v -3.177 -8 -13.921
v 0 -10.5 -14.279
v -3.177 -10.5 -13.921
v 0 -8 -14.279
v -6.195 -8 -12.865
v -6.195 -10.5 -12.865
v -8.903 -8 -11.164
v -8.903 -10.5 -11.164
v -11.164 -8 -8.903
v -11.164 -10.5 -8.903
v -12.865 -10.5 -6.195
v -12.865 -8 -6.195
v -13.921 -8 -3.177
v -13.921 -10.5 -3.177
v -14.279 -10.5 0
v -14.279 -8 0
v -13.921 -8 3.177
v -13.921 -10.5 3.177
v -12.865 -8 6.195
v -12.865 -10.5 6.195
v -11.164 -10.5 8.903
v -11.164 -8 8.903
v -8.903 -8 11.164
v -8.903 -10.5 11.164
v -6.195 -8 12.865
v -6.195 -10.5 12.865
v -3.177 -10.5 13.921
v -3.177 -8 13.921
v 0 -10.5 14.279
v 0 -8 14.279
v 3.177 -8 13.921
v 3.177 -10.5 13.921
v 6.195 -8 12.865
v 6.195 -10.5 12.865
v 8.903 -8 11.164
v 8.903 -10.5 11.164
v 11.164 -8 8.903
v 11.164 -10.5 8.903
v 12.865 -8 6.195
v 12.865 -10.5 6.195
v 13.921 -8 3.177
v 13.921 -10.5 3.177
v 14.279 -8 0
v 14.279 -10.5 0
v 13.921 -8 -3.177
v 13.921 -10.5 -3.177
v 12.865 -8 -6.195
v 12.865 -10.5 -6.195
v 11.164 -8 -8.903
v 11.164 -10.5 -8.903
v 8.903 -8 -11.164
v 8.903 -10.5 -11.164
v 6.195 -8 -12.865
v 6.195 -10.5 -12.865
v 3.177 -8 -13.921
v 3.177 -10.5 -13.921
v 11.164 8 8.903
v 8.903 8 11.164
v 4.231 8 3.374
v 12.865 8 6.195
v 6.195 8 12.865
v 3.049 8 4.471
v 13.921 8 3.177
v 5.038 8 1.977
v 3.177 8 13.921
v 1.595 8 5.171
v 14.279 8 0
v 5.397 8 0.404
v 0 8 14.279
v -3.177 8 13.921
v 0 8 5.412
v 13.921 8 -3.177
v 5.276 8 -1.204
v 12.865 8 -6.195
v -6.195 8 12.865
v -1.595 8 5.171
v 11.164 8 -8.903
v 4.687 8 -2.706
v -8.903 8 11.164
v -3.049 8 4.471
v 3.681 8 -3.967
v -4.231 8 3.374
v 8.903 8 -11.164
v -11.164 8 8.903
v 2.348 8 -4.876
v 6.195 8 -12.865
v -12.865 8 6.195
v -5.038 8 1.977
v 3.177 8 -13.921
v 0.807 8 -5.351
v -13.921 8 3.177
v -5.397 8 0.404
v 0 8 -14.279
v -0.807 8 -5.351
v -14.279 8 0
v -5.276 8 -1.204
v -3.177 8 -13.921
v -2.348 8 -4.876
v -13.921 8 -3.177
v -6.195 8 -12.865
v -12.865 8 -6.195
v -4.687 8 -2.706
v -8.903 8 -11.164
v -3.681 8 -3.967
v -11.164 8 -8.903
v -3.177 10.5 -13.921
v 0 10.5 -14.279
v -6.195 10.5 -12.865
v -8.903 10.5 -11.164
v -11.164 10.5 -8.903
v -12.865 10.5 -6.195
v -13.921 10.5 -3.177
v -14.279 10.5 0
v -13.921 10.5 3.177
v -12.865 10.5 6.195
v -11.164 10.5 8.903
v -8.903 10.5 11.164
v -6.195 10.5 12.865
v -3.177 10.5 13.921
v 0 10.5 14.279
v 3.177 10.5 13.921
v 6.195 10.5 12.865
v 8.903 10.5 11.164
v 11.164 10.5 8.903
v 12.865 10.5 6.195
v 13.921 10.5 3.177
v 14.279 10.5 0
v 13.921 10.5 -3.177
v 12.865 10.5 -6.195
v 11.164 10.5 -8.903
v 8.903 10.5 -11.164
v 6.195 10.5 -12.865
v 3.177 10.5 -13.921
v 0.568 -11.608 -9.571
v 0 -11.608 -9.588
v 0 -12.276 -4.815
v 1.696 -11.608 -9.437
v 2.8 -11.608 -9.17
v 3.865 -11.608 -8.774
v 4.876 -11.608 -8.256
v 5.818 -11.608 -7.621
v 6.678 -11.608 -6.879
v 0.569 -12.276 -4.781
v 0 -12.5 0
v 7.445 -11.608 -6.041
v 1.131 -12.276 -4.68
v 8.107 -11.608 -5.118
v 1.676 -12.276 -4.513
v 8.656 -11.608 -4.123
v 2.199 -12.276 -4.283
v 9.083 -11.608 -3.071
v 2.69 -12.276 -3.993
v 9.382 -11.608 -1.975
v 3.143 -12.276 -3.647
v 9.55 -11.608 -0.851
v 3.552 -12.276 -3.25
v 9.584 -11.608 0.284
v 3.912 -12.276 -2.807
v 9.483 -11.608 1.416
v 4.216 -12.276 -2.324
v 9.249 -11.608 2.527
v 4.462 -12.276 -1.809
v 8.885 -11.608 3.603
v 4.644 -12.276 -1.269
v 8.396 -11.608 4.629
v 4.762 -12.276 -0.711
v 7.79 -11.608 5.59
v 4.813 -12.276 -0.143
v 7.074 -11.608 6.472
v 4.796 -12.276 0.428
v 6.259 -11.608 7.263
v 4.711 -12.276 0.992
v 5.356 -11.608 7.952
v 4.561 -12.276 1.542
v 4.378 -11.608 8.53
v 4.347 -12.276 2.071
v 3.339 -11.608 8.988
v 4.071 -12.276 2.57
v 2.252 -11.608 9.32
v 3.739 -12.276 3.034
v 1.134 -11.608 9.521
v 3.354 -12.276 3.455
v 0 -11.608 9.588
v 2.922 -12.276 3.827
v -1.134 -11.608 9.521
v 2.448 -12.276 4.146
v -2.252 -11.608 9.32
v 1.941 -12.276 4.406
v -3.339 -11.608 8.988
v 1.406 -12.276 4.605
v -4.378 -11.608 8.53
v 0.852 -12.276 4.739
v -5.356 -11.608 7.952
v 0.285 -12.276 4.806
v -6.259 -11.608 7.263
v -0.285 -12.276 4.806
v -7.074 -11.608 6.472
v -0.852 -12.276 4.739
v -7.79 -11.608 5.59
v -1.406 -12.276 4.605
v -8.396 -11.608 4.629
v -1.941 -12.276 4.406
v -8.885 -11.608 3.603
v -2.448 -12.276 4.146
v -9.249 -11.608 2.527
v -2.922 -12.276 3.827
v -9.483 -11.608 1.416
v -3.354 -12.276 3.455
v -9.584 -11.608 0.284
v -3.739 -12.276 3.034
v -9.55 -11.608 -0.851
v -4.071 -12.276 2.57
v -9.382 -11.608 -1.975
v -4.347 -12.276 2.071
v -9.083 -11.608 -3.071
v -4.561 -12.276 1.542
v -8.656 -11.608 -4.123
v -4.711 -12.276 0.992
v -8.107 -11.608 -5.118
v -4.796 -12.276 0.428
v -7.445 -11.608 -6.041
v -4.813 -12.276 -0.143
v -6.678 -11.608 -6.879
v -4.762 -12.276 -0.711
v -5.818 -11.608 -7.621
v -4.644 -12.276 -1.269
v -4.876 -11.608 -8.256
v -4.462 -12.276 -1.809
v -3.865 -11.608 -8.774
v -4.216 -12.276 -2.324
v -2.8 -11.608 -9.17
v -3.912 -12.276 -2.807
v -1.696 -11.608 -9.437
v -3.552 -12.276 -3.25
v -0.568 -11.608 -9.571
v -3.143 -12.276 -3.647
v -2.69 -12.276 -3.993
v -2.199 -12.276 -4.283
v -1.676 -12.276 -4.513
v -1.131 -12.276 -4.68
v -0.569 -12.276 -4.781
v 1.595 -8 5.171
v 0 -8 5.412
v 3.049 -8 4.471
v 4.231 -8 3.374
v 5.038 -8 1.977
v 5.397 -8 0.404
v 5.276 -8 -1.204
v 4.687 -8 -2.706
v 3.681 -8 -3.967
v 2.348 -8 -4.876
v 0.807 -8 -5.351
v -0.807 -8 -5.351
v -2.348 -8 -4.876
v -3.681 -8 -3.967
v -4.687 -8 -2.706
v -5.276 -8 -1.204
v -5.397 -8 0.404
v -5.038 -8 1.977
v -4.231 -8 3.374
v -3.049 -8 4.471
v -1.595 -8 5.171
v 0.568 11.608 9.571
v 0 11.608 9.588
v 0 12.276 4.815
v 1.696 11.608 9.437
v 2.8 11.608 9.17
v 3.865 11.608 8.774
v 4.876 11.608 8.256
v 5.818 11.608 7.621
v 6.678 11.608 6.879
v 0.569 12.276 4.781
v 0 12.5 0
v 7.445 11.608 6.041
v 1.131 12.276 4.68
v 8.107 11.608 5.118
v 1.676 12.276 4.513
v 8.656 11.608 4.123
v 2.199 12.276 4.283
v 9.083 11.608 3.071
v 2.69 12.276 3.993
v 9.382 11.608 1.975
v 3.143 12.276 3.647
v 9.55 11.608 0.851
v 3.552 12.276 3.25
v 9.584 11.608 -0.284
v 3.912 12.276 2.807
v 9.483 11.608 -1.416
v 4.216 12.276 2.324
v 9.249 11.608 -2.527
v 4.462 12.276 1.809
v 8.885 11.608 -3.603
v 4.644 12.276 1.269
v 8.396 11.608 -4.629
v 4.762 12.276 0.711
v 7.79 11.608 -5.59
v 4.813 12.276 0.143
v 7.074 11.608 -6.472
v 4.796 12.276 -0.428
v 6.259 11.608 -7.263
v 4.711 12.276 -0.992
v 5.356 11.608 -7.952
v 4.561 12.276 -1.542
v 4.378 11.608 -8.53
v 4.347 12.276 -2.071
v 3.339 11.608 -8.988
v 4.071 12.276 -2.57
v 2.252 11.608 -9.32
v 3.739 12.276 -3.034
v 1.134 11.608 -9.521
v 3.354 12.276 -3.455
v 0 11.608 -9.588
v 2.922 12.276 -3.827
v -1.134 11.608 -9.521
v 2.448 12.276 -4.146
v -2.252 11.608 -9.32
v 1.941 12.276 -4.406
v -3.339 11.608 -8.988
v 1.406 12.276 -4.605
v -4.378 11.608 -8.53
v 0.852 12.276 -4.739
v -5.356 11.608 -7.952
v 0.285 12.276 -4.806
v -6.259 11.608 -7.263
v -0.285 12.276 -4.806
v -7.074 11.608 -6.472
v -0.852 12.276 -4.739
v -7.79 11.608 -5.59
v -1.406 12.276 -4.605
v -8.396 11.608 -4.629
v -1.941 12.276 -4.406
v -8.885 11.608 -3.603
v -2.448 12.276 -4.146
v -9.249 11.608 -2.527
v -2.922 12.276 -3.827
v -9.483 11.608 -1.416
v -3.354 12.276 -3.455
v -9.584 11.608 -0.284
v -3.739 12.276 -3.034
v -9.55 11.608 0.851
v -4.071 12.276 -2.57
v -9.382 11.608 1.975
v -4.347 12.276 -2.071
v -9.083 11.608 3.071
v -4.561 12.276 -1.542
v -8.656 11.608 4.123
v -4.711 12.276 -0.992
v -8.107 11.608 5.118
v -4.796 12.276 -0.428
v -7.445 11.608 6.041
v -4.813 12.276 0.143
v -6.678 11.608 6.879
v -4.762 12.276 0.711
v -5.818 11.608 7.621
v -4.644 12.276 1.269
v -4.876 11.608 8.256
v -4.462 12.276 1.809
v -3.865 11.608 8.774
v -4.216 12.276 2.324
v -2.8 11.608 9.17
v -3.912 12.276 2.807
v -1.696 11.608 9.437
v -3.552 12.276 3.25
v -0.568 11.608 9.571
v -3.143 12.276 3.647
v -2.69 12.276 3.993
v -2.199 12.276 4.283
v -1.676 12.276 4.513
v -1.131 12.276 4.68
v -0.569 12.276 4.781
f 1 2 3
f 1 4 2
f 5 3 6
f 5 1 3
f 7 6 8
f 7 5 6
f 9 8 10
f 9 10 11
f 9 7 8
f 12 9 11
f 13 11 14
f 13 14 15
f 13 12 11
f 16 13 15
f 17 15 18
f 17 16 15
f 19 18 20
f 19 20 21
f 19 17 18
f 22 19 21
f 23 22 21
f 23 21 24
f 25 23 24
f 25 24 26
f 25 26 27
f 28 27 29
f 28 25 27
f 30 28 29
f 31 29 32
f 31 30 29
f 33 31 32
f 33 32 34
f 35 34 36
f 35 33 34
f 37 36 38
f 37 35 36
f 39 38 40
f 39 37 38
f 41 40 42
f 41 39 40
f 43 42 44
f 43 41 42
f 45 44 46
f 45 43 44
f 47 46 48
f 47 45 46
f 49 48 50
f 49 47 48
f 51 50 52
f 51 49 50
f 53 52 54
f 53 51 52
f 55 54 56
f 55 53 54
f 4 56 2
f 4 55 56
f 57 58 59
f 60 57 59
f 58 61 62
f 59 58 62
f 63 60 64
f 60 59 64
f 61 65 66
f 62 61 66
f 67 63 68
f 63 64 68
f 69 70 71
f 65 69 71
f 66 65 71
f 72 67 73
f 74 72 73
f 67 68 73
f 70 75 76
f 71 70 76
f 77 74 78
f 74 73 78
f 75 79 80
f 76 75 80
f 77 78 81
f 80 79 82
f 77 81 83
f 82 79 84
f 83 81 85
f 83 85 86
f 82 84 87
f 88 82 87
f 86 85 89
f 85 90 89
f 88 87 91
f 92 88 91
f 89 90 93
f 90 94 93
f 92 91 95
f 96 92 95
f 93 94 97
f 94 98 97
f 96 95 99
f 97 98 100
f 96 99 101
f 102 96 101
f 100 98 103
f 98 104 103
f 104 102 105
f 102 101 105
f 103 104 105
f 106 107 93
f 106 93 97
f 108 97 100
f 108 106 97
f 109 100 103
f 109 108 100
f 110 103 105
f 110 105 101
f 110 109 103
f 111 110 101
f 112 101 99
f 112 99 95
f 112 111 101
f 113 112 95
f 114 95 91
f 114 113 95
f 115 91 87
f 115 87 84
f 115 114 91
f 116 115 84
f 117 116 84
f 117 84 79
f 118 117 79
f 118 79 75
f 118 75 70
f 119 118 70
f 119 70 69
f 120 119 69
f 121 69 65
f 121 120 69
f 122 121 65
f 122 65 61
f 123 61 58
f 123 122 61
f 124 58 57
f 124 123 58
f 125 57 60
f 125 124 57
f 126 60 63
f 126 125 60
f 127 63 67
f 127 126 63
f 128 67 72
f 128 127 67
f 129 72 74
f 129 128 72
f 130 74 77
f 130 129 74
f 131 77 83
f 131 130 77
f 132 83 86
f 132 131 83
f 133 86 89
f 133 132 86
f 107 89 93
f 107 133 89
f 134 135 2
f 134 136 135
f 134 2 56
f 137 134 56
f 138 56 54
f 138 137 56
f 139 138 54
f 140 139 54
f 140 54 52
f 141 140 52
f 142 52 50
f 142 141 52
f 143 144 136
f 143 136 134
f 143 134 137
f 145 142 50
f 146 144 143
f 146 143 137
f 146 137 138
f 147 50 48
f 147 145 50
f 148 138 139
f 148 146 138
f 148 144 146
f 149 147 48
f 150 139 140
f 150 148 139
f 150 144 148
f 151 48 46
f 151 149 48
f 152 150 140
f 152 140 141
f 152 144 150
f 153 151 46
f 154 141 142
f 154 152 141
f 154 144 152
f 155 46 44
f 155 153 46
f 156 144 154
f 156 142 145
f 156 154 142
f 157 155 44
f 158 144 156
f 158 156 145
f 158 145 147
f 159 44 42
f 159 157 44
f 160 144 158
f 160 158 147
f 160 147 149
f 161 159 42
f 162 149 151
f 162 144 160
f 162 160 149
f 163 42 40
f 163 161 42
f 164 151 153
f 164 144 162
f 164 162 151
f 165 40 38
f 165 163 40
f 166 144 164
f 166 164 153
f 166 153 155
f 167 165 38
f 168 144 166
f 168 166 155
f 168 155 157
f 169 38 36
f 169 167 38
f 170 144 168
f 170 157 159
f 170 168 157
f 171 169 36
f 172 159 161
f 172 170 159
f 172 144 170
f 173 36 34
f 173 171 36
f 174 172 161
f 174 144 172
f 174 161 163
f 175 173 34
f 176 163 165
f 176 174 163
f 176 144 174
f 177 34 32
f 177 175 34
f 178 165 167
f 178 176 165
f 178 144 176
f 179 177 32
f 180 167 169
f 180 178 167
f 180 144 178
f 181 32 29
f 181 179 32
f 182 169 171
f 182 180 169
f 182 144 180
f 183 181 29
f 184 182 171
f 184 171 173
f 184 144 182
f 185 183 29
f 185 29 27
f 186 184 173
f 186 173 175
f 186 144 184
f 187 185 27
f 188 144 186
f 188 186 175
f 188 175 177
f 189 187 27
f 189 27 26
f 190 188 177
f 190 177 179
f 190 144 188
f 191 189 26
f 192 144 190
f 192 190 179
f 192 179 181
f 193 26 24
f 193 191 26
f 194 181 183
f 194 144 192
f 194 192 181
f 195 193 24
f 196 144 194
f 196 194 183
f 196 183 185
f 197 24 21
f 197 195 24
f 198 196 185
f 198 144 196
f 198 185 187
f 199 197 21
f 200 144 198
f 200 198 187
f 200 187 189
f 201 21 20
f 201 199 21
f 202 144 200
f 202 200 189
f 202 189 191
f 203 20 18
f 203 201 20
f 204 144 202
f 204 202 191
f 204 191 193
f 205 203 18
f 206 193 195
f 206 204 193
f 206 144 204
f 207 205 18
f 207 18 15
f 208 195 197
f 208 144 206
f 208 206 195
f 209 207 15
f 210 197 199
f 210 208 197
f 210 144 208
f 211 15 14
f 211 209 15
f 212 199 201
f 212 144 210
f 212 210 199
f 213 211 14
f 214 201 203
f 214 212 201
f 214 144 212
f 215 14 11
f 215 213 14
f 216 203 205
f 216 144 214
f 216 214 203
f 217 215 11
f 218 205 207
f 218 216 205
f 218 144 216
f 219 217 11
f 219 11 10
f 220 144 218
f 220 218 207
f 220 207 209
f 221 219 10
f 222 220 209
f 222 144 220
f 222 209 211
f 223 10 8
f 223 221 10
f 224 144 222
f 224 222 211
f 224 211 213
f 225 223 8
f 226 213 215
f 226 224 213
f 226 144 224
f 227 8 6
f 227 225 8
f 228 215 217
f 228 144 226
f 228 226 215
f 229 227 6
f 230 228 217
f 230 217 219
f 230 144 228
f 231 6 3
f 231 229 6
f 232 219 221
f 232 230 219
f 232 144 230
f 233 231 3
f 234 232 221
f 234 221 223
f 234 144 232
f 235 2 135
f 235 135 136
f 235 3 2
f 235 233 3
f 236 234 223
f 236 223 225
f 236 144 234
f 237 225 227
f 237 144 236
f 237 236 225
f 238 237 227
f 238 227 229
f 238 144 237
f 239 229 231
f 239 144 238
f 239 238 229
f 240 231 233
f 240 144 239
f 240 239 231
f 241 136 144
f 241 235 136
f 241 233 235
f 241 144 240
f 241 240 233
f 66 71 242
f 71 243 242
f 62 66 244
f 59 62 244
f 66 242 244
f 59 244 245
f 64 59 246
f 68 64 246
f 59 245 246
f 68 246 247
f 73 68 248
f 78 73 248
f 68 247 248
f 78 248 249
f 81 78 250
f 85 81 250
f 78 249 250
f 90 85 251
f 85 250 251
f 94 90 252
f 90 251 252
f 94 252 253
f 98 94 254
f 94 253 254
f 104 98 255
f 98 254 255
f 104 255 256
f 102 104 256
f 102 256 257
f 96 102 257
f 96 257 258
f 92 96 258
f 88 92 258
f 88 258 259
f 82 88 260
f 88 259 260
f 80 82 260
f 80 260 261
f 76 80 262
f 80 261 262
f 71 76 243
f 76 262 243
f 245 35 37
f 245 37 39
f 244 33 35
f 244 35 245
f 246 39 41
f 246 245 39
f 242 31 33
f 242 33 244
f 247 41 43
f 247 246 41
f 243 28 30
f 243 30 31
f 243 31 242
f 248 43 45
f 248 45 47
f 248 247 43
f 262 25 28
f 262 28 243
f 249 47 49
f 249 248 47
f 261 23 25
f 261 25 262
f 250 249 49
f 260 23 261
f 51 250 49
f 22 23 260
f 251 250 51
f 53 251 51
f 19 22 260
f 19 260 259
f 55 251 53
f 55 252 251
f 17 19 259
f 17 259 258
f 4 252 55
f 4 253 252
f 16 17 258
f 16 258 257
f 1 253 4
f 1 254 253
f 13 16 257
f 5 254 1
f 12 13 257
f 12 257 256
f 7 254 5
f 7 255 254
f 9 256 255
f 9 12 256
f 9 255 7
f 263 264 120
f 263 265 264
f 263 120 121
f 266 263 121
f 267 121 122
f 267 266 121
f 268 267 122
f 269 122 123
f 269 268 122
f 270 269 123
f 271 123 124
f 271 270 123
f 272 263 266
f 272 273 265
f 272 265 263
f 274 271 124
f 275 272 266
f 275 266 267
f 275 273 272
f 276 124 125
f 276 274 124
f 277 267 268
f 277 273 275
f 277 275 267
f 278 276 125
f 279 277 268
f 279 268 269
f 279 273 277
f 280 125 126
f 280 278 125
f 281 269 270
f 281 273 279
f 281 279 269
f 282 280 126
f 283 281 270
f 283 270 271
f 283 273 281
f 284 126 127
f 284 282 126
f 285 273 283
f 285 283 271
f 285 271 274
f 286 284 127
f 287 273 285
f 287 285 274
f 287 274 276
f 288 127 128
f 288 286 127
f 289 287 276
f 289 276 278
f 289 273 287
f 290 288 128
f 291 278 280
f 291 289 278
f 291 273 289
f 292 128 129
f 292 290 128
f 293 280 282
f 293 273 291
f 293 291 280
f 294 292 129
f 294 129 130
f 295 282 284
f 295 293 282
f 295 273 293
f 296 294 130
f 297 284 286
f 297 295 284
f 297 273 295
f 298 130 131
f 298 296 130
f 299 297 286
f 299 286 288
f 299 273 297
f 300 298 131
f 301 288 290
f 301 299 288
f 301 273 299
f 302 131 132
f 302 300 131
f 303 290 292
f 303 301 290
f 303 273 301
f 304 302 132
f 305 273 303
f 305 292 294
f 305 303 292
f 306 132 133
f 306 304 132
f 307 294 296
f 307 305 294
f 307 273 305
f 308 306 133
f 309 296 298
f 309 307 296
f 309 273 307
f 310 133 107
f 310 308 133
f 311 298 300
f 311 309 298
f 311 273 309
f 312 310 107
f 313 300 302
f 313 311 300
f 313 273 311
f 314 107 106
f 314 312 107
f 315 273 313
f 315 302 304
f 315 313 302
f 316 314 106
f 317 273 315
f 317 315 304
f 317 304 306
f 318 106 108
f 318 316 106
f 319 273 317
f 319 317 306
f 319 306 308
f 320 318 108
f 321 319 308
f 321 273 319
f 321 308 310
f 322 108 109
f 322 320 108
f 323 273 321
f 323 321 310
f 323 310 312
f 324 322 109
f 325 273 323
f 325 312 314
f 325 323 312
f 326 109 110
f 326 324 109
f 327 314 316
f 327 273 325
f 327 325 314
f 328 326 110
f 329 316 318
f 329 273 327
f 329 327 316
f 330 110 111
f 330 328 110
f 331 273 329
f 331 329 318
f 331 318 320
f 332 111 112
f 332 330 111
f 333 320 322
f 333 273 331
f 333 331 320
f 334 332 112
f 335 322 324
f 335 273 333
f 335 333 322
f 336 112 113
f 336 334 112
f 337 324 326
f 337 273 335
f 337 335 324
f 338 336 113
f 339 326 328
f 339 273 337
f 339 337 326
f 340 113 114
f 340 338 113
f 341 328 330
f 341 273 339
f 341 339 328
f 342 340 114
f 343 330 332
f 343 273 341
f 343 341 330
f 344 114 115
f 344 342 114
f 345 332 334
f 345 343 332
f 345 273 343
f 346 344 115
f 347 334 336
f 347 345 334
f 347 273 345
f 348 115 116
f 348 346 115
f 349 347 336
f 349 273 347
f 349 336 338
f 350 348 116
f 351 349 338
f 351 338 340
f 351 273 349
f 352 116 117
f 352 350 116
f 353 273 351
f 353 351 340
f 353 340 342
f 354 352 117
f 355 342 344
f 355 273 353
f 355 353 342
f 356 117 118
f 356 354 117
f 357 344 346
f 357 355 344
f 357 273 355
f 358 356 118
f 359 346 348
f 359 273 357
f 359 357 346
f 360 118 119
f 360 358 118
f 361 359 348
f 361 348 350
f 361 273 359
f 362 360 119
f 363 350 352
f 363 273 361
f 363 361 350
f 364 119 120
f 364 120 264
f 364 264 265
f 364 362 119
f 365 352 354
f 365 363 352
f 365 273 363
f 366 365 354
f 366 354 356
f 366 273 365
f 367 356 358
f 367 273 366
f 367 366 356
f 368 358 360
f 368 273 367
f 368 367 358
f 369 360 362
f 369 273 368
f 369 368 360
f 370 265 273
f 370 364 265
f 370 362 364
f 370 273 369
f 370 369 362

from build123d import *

# Parameters (mm, degrees)
SKETCH1_R           = 14.278677311
SKETCH1_R_2         = 5.411731441
BOSS_EXTRUDE1_DEPTH = 10.5
SKETCH1_3_R         = 14.278677311
SKETCH1_3_R_2       = 5.411731441
CUT_EXTRUDE1_DEPTH  = 8
DOME1_FACE_RADIUS   = 14.278677311
DOME1_HEIGHT        = 2
DOME2_FACE_RADIUS   = 14.278677311
DOME2_HEIGHT        = 2


with BuildPart() as part:
    # Sketch1 → Boss-Extrude1 (new, symmetric)
    with BuildSketch(Plane(origin=(0, 0, 0), x_dir=(1, 0, 0), z_dir=(0, 1, 0))):
        with Locations(Location((0, 0, 0), (0, 0, 90))):
            Circle(SKETCH1_R)
        Circle(SKETCH1_R_2, mode=Mode.SUBTRACT)
        Circle(SKETCH1_R_2)
    extrude(amount=BOSS_EXTRUDE1_DEPTH, both=True)

    # Sketch1<3> → Cut-Extrude1 (cut, symmetric)
    with BuildSketch(Plane(origin=(0, 0, 0), x_dir=(1, 0, 0), z_dir=(0, 1, 0))):
        with Locations(Location((0, 0, 0), (0, 0, 90))):
            Circle(SKETCH1_3_R)
        with Locations(Location((0, 0, 0), (0, 0, 270))):
            Circle(SKETCH1_3_R_2, mode=Mode.SUBTRACT)
    extrude(amount=CUT_EXTRUDE1_DEPTH, both=True, mode=Mode.SUBTRACT)

    # Dome1: a dome of height H over a round flat face of radius A is a cap of a sphere of radius (A * A + H * H) / (2 * H)
    dome1_r = (DOME1_FACE_RADIUS * DOME1_FACE_RADIUS + DOME1_HEIGHT * DOME1_HEIGHT) / (2 * DOME1_HEIGHT)
    dome1_base = Plane((0, -10.5, 0), z_dir=(0, -1, 0))
    with Locations(dome1_base.offset(DOME1_HEIGHT - dome1_r)):
        dome1_ball = Sphere(dome1_r, mode=Mode.PRIVATE)
    add(split(dome1_ball, bisect_by=dome1_base, keep=Keep.TOP, mode=Mode.PRIVATE))

    # Dome2: a dome of height H over a round flat face of radius A is a cap of a sphere of radius (A * A + H * H) / (2 * H)
    dome2_r = (DOME2_FACE_RADIUS * DOME2_FACE_RADIUS + DOME2_HEIGHT * DOME2_HEIGHT) / (2 * DOME2_HEIGHT)
    dome2_base = Plane((0, 10.5, 0), z_dir=(0, 1, 0))
    with Locations(dome2_base.offset(DOME2_HEIGHT - dome2_r)):
        dome2_ball = Sphere(dome2_r, mode=Mode.PRIVATE)
    add(split(dome2_ball, bisect_by=dome2_base, keep=Keep.TOP, mode=Mode.PRIVATE))


solid = part.part
